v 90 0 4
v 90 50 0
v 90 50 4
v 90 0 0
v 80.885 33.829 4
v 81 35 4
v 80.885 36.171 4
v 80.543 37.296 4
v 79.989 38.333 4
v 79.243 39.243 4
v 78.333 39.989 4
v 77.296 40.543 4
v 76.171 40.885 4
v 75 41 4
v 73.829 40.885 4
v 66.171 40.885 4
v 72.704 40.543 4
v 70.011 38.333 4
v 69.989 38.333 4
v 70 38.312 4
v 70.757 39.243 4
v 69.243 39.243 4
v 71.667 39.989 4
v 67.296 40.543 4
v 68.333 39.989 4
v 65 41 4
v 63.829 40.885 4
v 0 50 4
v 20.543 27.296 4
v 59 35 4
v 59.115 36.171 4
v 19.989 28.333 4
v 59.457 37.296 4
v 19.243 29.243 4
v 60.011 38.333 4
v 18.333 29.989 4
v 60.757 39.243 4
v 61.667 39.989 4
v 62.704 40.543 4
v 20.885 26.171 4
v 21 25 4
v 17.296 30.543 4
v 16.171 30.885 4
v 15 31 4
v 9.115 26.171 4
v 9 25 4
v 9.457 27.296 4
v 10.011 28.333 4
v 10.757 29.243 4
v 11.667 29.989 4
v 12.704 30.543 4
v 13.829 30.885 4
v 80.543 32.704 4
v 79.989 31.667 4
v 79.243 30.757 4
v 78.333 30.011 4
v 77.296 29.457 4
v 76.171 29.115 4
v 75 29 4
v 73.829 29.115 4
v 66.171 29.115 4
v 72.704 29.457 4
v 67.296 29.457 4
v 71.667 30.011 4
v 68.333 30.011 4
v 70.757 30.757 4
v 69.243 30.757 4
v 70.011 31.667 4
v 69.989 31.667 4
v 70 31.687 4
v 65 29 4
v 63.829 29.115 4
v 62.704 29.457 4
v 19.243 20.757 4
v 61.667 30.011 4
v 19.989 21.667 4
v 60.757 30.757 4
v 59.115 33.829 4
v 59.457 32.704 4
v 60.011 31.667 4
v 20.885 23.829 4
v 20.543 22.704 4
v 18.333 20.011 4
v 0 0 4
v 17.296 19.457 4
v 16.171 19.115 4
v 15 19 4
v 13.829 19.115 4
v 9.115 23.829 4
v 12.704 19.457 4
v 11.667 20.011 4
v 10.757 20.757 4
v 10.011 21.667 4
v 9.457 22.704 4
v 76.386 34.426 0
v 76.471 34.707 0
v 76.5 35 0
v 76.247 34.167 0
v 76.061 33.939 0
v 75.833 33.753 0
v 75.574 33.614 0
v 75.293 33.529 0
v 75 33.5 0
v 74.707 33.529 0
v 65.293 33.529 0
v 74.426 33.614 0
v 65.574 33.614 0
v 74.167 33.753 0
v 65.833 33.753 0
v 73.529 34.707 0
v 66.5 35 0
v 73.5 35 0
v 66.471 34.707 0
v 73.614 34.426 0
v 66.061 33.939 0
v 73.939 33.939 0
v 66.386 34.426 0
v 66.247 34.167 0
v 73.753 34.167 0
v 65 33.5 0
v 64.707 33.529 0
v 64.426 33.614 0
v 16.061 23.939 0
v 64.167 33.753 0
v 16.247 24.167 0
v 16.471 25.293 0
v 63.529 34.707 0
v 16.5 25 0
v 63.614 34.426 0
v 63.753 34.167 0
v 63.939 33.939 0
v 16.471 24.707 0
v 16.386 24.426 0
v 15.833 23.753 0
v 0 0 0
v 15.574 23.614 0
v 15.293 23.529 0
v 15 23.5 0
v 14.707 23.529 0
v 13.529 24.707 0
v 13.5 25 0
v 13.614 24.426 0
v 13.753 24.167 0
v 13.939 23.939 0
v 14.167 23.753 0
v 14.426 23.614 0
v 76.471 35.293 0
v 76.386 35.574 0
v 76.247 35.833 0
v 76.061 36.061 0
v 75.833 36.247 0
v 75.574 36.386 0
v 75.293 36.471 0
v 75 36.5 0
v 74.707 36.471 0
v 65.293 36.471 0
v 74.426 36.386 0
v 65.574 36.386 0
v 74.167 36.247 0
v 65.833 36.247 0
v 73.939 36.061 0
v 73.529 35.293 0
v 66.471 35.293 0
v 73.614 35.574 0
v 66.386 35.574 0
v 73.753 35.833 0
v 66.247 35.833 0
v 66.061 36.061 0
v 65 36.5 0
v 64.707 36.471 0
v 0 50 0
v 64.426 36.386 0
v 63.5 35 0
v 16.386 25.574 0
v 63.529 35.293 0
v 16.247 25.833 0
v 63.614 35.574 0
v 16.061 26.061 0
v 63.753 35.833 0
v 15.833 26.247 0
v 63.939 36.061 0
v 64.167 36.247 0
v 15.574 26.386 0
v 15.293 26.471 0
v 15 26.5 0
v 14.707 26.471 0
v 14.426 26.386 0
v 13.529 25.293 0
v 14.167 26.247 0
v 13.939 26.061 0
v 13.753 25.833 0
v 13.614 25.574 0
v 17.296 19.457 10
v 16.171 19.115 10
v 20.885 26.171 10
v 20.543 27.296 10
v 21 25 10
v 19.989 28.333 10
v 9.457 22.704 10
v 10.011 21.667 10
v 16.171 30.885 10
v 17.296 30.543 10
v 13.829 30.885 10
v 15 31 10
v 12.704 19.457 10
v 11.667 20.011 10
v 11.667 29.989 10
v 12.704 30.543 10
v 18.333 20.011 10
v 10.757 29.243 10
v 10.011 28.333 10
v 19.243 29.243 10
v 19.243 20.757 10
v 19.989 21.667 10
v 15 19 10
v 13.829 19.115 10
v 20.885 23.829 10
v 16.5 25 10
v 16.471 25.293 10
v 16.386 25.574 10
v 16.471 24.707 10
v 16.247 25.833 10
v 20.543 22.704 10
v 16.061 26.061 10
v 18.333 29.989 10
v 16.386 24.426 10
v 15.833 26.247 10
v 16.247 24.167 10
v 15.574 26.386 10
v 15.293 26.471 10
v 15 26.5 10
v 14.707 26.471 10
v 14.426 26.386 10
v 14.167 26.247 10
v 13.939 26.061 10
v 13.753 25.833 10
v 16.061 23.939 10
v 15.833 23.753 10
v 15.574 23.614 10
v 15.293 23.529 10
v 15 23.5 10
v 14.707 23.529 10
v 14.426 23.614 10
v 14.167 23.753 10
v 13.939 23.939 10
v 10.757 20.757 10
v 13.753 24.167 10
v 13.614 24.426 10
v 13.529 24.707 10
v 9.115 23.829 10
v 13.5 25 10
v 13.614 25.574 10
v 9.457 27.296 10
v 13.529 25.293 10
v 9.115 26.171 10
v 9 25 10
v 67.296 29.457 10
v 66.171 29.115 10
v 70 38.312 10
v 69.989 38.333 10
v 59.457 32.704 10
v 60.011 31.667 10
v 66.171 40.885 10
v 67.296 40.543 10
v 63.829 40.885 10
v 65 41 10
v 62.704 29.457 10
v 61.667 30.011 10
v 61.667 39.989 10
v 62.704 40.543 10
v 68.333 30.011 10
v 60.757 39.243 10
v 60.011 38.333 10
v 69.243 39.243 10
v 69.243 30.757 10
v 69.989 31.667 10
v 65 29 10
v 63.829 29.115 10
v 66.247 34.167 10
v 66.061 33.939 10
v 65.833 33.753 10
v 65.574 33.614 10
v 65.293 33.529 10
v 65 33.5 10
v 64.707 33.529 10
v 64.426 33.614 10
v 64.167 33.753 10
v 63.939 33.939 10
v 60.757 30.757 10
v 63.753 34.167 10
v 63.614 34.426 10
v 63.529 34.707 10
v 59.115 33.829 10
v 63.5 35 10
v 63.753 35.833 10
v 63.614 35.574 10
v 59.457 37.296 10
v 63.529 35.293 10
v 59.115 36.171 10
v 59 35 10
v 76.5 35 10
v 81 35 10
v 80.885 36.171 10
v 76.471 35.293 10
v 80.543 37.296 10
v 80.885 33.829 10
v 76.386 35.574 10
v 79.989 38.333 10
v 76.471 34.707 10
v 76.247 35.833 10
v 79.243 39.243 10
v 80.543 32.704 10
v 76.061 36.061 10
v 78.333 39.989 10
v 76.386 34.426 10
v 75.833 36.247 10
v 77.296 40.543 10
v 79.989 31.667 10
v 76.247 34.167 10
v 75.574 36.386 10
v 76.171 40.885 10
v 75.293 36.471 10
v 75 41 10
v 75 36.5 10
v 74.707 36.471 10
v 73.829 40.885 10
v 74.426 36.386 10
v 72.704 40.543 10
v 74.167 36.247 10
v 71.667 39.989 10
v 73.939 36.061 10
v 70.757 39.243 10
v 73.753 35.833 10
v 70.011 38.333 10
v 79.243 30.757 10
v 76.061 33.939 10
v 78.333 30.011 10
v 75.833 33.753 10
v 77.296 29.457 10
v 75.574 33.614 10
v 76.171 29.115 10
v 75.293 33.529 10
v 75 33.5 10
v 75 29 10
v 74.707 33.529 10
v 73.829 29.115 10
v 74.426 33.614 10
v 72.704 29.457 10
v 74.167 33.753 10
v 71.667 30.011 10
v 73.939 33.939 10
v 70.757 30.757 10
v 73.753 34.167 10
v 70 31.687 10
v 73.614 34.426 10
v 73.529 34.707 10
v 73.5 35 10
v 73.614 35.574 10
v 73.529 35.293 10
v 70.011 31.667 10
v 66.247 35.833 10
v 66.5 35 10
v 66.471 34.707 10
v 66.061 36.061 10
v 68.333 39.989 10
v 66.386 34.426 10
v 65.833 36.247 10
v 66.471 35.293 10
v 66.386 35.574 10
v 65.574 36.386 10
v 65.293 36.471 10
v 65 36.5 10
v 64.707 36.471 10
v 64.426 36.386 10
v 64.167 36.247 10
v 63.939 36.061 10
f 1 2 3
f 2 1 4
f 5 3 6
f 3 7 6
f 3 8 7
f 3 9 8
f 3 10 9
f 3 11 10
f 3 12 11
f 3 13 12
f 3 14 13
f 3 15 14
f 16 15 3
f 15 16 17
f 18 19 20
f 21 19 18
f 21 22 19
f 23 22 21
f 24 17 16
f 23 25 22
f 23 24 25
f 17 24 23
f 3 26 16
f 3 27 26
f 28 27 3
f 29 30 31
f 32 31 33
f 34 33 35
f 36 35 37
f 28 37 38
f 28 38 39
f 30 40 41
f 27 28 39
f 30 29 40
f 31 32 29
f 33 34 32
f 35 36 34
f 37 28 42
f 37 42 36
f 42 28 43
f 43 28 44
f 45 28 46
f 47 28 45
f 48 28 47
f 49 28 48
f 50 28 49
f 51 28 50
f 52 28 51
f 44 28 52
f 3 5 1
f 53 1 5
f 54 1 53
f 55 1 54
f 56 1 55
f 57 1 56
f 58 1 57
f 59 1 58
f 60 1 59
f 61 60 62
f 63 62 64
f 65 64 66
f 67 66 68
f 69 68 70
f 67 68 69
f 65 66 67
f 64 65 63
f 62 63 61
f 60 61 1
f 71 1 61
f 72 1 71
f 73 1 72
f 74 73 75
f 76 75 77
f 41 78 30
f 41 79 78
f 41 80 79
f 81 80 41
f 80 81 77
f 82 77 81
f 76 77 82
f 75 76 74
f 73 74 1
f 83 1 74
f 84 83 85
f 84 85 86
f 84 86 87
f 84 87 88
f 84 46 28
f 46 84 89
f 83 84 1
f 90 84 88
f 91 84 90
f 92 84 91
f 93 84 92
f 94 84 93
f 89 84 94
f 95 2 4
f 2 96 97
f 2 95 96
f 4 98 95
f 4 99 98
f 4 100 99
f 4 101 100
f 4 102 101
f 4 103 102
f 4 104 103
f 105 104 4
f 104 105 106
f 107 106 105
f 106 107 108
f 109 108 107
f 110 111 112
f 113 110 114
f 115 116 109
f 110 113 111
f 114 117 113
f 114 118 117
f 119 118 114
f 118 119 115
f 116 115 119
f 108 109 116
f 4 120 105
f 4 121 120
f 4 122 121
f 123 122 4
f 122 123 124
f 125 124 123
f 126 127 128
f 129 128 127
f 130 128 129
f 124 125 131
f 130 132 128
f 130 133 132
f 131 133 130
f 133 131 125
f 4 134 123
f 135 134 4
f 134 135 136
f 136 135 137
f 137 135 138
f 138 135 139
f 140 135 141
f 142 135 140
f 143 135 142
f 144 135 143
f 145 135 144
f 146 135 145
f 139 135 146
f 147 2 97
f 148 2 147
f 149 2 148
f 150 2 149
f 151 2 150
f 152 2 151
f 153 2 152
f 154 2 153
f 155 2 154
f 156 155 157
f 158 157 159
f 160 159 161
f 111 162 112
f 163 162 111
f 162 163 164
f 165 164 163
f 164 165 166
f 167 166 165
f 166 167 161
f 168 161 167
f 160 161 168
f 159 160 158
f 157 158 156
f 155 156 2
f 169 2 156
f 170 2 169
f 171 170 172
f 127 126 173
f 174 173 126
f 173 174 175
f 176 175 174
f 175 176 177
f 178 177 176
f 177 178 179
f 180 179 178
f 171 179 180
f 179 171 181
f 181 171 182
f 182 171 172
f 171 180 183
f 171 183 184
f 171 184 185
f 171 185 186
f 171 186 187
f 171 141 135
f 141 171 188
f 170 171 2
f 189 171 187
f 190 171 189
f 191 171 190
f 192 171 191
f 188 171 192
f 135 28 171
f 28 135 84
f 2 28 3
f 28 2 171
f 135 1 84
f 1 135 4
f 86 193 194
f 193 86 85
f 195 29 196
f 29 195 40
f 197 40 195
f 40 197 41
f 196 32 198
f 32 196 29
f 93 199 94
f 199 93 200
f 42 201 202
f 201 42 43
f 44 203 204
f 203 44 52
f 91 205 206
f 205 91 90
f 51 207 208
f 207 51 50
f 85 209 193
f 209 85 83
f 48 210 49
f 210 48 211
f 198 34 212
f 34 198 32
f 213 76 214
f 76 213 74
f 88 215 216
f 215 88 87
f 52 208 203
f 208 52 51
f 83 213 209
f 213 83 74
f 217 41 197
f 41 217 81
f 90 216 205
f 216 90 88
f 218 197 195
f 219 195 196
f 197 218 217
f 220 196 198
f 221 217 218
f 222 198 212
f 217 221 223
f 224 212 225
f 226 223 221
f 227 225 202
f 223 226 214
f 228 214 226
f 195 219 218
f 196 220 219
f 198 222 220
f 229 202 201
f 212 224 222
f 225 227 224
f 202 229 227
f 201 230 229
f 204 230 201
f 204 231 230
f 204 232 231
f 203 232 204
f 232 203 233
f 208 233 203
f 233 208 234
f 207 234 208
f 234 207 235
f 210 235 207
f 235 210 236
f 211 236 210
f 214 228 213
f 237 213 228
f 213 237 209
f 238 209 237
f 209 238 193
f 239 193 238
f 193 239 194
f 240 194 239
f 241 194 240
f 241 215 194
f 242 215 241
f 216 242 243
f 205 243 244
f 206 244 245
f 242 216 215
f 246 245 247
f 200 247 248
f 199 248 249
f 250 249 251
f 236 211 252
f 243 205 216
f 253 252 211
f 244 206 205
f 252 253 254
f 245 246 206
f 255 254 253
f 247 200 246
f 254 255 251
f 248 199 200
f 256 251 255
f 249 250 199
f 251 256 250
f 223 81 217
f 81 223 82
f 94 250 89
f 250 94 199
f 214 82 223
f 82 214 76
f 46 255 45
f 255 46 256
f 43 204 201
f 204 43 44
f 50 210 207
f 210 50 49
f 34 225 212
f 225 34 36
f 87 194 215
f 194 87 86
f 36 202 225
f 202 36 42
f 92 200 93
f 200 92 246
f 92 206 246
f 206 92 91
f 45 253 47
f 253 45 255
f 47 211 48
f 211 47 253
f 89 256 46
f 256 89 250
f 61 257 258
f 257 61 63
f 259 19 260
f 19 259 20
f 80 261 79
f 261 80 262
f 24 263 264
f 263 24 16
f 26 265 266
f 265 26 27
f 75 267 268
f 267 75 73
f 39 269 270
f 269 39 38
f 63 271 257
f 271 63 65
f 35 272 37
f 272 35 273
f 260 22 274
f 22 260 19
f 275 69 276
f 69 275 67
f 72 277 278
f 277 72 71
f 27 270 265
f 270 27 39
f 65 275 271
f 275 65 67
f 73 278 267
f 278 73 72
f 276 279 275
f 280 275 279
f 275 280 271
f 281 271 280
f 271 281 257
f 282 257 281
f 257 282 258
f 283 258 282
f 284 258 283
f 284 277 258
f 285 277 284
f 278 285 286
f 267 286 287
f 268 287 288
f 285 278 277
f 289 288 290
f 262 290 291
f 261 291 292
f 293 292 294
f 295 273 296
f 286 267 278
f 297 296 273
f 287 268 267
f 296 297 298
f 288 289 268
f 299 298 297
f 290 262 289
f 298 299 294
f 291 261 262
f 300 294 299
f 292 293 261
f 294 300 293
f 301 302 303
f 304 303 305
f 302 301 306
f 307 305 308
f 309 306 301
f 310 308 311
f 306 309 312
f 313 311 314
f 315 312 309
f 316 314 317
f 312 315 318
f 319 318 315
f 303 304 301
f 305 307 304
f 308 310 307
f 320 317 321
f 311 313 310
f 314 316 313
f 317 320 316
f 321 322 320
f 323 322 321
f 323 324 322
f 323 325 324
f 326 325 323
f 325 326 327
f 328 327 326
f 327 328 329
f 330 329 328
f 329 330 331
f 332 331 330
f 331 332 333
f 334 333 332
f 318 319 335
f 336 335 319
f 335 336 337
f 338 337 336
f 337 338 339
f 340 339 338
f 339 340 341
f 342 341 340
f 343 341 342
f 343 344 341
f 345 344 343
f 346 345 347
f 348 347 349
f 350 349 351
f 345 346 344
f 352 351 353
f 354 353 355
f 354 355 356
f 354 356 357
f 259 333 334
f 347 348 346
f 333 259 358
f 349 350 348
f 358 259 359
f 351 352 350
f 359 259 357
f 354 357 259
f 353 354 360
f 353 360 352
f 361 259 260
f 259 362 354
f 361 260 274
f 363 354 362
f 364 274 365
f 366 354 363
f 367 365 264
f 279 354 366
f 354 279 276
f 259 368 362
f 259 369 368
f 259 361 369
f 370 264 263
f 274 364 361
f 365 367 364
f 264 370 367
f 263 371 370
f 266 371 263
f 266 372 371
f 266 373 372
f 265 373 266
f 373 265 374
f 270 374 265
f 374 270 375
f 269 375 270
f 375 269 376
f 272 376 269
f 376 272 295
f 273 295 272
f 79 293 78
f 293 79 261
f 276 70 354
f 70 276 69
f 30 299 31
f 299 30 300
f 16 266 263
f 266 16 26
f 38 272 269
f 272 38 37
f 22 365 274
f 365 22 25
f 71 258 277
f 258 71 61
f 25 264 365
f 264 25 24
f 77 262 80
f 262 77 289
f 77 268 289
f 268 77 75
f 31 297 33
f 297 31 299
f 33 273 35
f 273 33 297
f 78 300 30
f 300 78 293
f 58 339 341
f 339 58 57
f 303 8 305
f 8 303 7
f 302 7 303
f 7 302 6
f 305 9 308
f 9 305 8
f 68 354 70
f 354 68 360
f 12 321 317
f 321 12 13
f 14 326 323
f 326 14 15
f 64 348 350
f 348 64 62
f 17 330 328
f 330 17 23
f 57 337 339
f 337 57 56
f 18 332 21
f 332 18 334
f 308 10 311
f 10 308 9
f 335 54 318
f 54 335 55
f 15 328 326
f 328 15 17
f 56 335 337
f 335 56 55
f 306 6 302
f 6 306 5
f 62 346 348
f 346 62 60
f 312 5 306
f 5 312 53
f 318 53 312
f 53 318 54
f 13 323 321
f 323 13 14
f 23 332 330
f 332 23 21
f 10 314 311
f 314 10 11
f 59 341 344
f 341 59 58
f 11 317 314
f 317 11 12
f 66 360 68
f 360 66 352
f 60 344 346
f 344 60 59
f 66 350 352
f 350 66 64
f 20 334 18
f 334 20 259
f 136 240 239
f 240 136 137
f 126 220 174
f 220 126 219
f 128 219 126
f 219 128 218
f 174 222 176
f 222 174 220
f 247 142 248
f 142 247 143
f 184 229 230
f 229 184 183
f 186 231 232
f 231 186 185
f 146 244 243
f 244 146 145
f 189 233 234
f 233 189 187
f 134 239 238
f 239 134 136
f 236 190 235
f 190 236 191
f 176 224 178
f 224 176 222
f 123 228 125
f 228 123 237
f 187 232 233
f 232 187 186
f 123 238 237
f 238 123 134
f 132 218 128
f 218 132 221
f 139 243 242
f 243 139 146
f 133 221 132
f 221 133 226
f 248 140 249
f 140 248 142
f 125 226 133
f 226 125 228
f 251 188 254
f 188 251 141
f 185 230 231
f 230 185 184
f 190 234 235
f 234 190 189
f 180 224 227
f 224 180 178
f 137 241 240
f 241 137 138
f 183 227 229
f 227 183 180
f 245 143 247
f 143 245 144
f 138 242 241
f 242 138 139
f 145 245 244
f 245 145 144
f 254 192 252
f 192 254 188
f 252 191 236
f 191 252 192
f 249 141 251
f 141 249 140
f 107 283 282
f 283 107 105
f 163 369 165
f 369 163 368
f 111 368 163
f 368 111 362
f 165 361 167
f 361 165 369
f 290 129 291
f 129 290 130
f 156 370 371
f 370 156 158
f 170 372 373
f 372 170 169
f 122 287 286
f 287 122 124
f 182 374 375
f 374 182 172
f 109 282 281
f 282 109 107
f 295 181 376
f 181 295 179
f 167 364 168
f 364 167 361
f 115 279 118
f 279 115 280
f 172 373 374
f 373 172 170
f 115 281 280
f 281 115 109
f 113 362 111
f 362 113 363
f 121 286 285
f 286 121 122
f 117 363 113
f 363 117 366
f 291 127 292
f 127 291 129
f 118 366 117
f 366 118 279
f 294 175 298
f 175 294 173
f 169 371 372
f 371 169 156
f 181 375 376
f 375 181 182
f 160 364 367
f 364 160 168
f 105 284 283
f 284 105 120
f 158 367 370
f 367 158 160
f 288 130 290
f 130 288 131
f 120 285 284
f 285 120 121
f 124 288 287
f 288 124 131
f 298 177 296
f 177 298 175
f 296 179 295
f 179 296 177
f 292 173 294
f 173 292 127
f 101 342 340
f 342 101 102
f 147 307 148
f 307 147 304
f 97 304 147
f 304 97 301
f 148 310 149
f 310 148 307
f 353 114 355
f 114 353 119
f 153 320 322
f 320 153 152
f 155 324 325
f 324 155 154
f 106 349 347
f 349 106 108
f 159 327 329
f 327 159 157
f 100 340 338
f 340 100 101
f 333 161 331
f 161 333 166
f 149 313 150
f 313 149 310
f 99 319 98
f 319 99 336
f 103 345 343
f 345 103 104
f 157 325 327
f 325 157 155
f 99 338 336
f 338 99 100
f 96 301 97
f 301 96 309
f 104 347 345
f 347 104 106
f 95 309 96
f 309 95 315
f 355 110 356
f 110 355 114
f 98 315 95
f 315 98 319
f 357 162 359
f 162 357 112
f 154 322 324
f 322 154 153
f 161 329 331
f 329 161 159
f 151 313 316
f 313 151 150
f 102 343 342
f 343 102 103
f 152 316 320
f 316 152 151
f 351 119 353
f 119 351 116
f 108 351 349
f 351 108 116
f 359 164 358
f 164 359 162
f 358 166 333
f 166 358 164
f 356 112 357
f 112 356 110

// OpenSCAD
$fn = 32;

// ----------------------------------------------------------------------
// Boss field: plate with bosses at given coordinates
// ----------------------------------------------------------------------

// --- parameters (mm) ---
plate_l = 90;             // plate length, X
plate_w = 50;             // plate width, Y
plate_t = 4;              // plate thickness, Z
boss_d = 12;              // boss diameter
boss_h = 6;               // boss height above the plate
bore_d = 3;               // boss bore

total_h = plate_t + boss_h;  // overall height

difference() {
  union() {
    cube([plate_l, plate_w, plate_t]);
    translate([15, 25, plate_t]) cylinder(h = boss_h, d = boss_d);
    translate([65, 35, plate_t]) cylinder(h = boss_h, d = boss_d);
    translate([75, 35, plate_t]) cylinder(h = boss_h, d = boss_d);
  }
  translate([15, 25, -1]) cylinder(h = total_h + 2, d = bore_d);
  translate([65, 35, -1]) cylinder(h = total_h + 2, d = bore_d);
  translate([75, 35, -1]) cylinder(h = total_h + 2, d = bore_d);
}
